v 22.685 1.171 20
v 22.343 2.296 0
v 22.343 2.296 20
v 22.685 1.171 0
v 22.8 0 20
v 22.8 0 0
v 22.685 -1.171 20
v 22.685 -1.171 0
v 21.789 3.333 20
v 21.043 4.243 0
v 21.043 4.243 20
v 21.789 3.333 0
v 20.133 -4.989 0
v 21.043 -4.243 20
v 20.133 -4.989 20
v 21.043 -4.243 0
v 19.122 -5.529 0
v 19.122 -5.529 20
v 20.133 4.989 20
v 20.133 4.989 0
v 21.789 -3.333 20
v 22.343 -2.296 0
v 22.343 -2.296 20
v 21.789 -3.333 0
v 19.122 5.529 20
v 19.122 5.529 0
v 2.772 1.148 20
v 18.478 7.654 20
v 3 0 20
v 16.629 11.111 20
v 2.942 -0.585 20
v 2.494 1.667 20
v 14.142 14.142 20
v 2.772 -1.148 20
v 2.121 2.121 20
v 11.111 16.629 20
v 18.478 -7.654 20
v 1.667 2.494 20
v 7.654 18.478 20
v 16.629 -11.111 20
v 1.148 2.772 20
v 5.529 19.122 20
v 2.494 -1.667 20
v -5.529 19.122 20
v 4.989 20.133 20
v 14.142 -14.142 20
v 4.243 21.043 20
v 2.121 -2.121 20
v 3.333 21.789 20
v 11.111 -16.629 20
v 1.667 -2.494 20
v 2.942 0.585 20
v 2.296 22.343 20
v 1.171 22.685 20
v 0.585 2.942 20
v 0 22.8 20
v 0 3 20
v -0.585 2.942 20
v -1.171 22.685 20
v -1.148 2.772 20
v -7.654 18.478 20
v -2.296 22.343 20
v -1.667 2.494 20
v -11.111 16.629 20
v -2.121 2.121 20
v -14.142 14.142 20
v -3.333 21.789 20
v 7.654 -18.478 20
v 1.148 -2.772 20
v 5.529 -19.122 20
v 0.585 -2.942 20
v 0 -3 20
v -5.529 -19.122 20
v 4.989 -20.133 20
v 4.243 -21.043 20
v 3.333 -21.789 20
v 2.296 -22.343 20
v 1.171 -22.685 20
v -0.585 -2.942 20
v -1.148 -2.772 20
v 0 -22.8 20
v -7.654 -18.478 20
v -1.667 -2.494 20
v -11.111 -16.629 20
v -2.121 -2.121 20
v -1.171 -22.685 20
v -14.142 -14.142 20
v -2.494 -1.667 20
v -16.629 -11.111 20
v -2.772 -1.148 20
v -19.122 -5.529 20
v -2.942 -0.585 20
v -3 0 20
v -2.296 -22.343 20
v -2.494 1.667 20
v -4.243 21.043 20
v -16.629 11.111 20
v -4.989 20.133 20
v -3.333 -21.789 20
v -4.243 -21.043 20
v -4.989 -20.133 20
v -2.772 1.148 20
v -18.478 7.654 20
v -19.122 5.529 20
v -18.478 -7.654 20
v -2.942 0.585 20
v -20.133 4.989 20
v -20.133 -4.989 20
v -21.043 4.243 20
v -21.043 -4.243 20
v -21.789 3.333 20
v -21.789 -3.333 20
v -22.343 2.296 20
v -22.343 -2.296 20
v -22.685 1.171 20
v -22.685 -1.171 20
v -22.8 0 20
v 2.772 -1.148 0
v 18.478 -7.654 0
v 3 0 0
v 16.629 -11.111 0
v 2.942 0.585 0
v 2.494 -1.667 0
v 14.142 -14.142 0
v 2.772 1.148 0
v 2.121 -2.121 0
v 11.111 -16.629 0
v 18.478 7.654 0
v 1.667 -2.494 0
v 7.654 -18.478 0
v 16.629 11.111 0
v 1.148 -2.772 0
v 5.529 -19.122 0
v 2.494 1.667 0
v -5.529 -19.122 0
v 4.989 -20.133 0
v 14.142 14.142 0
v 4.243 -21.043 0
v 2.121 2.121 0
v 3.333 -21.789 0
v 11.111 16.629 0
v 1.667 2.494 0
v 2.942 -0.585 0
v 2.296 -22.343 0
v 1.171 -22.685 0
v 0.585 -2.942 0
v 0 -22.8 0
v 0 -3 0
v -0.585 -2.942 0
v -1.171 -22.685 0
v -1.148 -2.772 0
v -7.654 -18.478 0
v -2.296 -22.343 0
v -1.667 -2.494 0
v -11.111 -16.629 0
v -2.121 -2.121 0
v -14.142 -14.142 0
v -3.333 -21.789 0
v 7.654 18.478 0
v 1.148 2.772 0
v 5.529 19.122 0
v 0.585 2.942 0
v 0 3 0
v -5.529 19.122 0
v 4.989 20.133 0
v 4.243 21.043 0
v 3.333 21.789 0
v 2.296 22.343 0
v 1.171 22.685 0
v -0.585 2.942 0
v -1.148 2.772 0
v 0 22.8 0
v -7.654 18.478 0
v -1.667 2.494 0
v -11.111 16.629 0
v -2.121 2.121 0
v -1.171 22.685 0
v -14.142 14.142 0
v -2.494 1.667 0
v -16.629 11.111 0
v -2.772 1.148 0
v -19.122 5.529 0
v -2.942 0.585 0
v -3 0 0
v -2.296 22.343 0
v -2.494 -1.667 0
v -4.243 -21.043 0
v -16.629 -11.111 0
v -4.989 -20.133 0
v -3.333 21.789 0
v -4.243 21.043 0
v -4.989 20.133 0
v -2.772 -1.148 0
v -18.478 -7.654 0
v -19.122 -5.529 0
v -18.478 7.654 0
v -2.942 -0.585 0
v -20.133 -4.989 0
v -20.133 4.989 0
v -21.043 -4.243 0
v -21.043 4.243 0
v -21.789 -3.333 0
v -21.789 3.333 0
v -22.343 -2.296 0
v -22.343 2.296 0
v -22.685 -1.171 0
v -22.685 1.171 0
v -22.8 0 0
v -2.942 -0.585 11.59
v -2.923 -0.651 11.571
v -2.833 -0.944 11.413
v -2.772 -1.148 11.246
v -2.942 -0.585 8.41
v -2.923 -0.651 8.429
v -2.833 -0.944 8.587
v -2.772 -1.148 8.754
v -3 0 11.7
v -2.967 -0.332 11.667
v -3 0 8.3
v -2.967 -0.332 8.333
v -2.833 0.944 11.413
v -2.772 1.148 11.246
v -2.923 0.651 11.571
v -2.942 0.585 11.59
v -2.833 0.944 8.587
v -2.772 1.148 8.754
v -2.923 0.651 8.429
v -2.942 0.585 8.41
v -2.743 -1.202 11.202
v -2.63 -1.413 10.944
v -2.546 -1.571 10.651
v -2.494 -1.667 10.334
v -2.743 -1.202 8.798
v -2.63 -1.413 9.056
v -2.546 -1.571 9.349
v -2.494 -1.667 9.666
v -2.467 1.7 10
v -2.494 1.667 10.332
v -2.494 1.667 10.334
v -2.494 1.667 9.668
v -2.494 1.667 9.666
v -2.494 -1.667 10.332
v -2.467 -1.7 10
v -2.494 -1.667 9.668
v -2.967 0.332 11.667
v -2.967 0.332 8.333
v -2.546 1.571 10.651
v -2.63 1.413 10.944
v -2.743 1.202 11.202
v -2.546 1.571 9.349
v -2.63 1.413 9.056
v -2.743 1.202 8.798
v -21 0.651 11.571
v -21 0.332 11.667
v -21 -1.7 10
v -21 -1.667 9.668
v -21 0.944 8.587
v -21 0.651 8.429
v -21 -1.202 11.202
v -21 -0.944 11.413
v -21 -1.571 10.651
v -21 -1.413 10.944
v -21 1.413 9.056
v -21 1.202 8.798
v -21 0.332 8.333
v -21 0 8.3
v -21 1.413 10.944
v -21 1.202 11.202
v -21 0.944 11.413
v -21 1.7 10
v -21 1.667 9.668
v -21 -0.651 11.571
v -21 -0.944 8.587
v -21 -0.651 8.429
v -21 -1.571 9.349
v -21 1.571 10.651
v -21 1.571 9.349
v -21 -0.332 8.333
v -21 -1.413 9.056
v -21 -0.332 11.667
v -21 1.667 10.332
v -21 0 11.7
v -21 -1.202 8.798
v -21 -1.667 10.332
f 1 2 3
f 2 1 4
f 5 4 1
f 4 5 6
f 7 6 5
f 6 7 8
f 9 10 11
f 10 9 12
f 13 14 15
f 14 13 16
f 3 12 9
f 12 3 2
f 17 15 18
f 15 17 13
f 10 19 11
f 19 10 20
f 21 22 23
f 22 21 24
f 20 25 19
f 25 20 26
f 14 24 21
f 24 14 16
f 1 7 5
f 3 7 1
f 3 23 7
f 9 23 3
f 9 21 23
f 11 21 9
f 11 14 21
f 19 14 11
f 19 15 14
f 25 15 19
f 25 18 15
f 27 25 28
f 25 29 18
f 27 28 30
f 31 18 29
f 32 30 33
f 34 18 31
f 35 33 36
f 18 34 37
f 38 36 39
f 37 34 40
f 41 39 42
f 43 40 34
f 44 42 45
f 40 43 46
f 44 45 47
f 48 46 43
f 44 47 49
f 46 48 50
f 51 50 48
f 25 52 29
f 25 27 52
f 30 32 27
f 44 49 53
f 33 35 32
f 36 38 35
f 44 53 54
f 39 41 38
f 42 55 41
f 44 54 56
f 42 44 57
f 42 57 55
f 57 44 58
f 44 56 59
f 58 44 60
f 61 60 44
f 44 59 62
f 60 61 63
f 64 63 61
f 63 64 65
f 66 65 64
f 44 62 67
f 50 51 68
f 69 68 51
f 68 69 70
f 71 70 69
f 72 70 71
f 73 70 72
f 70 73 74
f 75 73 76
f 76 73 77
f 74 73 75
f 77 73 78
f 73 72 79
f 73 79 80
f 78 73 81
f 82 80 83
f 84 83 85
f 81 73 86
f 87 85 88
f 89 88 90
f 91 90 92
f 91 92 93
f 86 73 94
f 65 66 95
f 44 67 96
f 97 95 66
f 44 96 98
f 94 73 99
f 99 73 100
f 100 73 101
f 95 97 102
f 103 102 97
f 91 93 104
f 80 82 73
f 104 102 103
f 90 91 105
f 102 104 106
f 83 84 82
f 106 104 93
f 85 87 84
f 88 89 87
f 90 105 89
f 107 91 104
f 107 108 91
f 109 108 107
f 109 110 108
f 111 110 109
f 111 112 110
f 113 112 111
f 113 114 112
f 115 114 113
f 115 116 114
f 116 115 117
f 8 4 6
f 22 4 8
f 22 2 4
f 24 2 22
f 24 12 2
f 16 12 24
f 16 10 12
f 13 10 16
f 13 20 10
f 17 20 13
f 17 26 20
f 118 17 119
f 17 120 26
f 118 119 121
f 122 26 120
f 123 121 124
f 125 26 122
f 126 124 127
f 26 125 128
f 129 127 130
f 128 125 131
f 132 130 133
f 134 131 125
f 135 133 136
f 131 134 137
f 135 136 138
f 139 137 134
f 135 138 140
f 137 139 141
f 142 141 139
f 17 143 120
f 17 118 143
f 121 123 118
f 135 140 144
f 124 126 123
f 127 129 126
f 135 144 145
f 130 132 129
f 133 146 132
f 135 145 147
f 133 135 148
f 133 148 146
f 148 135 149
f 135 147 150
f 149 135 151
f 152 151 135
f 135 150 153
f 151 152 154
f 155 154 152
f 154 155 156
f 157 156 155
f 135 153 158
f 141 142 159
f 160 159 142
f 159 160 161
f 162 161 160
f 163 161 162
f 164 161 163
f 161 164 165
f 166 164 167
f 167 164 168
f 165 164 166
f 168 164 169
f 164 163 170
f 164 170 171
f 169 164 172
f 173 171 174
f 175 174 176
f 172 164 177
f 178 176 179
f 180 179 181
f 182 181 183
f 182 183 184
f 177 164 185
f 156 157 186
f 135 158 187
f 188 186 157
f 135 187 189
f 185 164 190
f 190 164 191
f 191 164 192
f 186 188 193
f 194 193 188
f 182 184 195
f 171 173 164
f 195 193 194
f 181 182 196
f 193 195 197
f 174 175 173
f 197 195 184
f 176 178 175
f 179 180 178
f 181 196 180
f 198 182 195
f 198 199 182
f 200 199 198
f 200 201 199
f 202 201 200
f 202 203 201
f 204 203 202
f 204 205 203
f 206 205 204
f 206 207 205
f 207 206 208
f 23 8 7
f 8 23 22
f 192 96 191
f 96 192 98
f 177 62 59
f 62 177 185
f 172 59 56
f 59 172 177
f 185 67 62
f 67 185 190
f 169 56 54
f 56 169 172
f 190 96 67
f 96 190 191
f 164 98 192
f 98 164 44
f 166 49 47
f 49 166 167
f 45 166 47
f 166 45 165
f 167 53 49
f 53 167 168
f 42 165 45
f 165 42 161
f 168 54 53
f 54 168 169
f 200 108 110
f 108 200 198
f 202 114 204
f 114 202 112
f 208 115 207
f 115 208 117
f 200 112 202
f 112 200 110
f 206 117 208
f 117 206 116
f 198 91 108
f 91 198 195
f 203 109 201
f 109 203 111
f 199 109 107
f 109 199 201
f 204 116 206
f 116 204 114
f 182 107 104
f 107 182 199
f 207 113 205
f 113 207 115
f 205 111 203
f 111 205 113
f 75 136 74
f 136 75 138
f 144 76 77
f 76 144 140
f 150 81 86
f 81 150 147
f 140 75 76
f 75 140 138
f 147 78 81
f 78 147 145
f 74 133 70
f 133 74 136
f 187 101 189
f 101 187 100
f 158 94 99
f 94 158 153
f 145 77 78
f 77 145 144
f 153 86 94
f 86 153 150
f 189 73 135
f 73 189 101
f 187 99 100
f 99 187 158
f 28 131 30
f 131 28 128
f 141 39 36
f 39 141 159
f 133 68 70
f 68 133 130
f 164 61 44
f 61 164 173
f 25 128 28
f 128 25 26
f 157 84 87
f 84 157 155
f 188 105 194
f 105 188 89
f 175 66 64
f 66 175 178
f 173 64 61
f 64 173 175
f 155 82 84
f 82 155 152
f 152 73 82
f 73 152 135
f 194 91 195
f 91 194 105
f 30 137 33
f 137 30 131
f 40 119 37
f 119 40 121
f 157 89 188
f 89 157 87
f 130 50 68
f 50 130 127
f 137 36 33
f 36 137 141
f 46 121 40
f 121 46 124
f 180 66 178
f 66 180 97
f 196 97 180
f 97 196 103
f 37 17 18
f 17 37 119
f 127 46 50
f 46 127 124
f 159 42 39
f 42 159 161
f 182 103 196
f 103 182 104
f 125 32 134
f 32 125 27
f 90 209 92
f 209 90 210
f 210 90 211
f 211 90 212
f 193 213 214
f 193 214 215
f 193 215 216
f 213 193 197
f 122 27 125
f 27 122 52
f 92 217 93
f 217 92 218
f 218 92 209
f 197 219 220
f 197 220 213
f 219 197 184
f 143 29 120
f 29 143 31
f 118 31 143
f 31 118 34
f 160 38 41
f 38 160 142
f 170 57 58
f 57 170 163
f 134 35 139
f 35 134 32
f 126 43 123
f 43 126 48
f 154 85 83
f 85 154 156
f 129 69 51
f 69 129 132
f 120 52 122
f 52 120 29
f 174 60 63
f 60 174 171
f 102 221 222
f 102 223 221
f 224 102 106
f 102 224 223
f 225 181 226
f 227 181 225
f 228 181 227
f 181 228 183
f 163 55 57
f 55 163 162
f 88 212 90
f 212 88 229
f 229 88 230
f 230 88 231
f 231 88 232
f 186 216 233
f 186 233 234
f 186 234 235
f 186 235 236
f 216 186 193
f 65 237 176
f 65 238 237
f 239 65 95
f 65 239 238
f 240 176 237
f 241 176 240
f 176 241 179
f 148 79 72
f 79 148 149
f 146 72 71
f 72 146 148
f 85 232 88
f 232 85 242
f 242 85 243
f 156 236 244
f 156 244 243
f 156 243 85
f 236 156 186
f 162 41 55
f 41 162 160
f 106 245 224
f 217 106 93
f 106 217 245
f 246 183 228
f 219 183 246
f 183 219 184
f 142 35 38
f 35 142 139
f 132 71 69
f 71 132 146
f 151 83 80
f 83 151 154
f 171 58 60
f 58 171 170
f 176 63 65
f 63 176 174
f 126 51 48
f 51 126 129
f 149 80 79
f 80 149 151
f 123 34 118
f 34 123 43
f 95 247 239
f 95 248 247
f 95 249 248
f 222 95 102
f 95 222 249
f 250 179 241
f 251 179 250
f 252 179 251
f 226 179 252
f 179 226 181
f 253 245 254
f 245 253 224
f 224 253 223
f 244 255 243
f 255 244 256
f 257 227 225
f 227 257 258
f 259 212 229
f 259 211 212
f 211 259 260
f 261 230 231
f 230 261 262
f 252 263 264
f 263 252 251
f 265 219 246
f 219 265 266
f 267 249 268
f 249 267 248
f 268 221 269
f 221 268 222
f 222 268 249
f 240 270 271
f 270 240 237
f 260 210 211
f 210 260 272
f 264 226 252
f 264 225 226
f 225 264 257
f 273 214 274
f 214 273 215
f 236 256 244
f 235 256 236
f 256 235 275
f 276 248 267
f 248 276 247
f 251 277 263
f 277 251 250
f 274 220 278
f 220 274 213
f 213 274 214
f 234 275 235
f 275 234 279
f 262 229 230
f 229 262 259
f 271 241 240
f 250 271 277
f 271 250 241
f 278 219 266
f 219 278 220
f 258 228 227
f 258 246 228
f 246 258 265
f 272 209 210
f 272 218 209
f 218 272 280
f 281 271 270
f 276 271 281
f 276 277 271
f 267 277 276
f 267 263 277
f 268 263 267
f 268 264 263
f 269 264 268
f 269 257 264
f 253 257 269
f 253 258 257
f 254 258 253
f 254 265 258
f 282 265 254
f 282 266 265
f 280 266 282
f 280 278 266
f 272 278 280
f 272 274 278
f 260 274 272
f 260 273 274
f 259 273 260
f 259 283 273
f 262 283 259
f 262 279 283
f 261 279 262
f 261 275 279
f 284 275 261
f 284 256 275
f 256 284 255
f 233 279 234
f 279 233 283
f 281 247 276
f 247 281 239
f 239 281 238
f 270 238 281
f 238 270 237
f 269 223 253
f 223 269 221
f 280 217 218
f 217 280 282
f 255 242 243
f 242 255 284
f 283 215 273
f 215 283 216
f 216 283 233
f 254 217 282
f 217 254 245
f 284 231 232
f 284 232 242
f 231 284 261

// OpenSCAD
$fn = 32;

// ----------------------------------------------------------------------
// Hand knob: 40 x 40 x 20 mm
// ----------------------------------------------------------------------

// --- parameters (mm) ---
head_d = 40;              // knob diameter
head_h = 20;              // knob height
hole_d = 6;               // shaft bore
set_d = 3.4;              // set screw tap hole
notch_d = 2.1;            // knurl groove diameter
lobes = 4;                // grip lobes

module body() {
  cylinder(h = head_h, d = head_d);
  for (i = [0 : lobes - 1])
    rotate([0, 0, i * 360 / lobes])
      translate([head_d * 0.42, 0, 0])
        cylinder(h = head_h, d = head_d * 0.3);
}

difference() {
  union() {
    body();
  }
  translate([0, 0, -1]) cylinder(h = head_h + 0 + 2, d = hole_d);
  translate([-head_d / 2 - 1, 0, head_h * 0.5]) rotate([0, 90, 0]) cylinder(h = head_d / 2 + 2, d = set_d);
}
